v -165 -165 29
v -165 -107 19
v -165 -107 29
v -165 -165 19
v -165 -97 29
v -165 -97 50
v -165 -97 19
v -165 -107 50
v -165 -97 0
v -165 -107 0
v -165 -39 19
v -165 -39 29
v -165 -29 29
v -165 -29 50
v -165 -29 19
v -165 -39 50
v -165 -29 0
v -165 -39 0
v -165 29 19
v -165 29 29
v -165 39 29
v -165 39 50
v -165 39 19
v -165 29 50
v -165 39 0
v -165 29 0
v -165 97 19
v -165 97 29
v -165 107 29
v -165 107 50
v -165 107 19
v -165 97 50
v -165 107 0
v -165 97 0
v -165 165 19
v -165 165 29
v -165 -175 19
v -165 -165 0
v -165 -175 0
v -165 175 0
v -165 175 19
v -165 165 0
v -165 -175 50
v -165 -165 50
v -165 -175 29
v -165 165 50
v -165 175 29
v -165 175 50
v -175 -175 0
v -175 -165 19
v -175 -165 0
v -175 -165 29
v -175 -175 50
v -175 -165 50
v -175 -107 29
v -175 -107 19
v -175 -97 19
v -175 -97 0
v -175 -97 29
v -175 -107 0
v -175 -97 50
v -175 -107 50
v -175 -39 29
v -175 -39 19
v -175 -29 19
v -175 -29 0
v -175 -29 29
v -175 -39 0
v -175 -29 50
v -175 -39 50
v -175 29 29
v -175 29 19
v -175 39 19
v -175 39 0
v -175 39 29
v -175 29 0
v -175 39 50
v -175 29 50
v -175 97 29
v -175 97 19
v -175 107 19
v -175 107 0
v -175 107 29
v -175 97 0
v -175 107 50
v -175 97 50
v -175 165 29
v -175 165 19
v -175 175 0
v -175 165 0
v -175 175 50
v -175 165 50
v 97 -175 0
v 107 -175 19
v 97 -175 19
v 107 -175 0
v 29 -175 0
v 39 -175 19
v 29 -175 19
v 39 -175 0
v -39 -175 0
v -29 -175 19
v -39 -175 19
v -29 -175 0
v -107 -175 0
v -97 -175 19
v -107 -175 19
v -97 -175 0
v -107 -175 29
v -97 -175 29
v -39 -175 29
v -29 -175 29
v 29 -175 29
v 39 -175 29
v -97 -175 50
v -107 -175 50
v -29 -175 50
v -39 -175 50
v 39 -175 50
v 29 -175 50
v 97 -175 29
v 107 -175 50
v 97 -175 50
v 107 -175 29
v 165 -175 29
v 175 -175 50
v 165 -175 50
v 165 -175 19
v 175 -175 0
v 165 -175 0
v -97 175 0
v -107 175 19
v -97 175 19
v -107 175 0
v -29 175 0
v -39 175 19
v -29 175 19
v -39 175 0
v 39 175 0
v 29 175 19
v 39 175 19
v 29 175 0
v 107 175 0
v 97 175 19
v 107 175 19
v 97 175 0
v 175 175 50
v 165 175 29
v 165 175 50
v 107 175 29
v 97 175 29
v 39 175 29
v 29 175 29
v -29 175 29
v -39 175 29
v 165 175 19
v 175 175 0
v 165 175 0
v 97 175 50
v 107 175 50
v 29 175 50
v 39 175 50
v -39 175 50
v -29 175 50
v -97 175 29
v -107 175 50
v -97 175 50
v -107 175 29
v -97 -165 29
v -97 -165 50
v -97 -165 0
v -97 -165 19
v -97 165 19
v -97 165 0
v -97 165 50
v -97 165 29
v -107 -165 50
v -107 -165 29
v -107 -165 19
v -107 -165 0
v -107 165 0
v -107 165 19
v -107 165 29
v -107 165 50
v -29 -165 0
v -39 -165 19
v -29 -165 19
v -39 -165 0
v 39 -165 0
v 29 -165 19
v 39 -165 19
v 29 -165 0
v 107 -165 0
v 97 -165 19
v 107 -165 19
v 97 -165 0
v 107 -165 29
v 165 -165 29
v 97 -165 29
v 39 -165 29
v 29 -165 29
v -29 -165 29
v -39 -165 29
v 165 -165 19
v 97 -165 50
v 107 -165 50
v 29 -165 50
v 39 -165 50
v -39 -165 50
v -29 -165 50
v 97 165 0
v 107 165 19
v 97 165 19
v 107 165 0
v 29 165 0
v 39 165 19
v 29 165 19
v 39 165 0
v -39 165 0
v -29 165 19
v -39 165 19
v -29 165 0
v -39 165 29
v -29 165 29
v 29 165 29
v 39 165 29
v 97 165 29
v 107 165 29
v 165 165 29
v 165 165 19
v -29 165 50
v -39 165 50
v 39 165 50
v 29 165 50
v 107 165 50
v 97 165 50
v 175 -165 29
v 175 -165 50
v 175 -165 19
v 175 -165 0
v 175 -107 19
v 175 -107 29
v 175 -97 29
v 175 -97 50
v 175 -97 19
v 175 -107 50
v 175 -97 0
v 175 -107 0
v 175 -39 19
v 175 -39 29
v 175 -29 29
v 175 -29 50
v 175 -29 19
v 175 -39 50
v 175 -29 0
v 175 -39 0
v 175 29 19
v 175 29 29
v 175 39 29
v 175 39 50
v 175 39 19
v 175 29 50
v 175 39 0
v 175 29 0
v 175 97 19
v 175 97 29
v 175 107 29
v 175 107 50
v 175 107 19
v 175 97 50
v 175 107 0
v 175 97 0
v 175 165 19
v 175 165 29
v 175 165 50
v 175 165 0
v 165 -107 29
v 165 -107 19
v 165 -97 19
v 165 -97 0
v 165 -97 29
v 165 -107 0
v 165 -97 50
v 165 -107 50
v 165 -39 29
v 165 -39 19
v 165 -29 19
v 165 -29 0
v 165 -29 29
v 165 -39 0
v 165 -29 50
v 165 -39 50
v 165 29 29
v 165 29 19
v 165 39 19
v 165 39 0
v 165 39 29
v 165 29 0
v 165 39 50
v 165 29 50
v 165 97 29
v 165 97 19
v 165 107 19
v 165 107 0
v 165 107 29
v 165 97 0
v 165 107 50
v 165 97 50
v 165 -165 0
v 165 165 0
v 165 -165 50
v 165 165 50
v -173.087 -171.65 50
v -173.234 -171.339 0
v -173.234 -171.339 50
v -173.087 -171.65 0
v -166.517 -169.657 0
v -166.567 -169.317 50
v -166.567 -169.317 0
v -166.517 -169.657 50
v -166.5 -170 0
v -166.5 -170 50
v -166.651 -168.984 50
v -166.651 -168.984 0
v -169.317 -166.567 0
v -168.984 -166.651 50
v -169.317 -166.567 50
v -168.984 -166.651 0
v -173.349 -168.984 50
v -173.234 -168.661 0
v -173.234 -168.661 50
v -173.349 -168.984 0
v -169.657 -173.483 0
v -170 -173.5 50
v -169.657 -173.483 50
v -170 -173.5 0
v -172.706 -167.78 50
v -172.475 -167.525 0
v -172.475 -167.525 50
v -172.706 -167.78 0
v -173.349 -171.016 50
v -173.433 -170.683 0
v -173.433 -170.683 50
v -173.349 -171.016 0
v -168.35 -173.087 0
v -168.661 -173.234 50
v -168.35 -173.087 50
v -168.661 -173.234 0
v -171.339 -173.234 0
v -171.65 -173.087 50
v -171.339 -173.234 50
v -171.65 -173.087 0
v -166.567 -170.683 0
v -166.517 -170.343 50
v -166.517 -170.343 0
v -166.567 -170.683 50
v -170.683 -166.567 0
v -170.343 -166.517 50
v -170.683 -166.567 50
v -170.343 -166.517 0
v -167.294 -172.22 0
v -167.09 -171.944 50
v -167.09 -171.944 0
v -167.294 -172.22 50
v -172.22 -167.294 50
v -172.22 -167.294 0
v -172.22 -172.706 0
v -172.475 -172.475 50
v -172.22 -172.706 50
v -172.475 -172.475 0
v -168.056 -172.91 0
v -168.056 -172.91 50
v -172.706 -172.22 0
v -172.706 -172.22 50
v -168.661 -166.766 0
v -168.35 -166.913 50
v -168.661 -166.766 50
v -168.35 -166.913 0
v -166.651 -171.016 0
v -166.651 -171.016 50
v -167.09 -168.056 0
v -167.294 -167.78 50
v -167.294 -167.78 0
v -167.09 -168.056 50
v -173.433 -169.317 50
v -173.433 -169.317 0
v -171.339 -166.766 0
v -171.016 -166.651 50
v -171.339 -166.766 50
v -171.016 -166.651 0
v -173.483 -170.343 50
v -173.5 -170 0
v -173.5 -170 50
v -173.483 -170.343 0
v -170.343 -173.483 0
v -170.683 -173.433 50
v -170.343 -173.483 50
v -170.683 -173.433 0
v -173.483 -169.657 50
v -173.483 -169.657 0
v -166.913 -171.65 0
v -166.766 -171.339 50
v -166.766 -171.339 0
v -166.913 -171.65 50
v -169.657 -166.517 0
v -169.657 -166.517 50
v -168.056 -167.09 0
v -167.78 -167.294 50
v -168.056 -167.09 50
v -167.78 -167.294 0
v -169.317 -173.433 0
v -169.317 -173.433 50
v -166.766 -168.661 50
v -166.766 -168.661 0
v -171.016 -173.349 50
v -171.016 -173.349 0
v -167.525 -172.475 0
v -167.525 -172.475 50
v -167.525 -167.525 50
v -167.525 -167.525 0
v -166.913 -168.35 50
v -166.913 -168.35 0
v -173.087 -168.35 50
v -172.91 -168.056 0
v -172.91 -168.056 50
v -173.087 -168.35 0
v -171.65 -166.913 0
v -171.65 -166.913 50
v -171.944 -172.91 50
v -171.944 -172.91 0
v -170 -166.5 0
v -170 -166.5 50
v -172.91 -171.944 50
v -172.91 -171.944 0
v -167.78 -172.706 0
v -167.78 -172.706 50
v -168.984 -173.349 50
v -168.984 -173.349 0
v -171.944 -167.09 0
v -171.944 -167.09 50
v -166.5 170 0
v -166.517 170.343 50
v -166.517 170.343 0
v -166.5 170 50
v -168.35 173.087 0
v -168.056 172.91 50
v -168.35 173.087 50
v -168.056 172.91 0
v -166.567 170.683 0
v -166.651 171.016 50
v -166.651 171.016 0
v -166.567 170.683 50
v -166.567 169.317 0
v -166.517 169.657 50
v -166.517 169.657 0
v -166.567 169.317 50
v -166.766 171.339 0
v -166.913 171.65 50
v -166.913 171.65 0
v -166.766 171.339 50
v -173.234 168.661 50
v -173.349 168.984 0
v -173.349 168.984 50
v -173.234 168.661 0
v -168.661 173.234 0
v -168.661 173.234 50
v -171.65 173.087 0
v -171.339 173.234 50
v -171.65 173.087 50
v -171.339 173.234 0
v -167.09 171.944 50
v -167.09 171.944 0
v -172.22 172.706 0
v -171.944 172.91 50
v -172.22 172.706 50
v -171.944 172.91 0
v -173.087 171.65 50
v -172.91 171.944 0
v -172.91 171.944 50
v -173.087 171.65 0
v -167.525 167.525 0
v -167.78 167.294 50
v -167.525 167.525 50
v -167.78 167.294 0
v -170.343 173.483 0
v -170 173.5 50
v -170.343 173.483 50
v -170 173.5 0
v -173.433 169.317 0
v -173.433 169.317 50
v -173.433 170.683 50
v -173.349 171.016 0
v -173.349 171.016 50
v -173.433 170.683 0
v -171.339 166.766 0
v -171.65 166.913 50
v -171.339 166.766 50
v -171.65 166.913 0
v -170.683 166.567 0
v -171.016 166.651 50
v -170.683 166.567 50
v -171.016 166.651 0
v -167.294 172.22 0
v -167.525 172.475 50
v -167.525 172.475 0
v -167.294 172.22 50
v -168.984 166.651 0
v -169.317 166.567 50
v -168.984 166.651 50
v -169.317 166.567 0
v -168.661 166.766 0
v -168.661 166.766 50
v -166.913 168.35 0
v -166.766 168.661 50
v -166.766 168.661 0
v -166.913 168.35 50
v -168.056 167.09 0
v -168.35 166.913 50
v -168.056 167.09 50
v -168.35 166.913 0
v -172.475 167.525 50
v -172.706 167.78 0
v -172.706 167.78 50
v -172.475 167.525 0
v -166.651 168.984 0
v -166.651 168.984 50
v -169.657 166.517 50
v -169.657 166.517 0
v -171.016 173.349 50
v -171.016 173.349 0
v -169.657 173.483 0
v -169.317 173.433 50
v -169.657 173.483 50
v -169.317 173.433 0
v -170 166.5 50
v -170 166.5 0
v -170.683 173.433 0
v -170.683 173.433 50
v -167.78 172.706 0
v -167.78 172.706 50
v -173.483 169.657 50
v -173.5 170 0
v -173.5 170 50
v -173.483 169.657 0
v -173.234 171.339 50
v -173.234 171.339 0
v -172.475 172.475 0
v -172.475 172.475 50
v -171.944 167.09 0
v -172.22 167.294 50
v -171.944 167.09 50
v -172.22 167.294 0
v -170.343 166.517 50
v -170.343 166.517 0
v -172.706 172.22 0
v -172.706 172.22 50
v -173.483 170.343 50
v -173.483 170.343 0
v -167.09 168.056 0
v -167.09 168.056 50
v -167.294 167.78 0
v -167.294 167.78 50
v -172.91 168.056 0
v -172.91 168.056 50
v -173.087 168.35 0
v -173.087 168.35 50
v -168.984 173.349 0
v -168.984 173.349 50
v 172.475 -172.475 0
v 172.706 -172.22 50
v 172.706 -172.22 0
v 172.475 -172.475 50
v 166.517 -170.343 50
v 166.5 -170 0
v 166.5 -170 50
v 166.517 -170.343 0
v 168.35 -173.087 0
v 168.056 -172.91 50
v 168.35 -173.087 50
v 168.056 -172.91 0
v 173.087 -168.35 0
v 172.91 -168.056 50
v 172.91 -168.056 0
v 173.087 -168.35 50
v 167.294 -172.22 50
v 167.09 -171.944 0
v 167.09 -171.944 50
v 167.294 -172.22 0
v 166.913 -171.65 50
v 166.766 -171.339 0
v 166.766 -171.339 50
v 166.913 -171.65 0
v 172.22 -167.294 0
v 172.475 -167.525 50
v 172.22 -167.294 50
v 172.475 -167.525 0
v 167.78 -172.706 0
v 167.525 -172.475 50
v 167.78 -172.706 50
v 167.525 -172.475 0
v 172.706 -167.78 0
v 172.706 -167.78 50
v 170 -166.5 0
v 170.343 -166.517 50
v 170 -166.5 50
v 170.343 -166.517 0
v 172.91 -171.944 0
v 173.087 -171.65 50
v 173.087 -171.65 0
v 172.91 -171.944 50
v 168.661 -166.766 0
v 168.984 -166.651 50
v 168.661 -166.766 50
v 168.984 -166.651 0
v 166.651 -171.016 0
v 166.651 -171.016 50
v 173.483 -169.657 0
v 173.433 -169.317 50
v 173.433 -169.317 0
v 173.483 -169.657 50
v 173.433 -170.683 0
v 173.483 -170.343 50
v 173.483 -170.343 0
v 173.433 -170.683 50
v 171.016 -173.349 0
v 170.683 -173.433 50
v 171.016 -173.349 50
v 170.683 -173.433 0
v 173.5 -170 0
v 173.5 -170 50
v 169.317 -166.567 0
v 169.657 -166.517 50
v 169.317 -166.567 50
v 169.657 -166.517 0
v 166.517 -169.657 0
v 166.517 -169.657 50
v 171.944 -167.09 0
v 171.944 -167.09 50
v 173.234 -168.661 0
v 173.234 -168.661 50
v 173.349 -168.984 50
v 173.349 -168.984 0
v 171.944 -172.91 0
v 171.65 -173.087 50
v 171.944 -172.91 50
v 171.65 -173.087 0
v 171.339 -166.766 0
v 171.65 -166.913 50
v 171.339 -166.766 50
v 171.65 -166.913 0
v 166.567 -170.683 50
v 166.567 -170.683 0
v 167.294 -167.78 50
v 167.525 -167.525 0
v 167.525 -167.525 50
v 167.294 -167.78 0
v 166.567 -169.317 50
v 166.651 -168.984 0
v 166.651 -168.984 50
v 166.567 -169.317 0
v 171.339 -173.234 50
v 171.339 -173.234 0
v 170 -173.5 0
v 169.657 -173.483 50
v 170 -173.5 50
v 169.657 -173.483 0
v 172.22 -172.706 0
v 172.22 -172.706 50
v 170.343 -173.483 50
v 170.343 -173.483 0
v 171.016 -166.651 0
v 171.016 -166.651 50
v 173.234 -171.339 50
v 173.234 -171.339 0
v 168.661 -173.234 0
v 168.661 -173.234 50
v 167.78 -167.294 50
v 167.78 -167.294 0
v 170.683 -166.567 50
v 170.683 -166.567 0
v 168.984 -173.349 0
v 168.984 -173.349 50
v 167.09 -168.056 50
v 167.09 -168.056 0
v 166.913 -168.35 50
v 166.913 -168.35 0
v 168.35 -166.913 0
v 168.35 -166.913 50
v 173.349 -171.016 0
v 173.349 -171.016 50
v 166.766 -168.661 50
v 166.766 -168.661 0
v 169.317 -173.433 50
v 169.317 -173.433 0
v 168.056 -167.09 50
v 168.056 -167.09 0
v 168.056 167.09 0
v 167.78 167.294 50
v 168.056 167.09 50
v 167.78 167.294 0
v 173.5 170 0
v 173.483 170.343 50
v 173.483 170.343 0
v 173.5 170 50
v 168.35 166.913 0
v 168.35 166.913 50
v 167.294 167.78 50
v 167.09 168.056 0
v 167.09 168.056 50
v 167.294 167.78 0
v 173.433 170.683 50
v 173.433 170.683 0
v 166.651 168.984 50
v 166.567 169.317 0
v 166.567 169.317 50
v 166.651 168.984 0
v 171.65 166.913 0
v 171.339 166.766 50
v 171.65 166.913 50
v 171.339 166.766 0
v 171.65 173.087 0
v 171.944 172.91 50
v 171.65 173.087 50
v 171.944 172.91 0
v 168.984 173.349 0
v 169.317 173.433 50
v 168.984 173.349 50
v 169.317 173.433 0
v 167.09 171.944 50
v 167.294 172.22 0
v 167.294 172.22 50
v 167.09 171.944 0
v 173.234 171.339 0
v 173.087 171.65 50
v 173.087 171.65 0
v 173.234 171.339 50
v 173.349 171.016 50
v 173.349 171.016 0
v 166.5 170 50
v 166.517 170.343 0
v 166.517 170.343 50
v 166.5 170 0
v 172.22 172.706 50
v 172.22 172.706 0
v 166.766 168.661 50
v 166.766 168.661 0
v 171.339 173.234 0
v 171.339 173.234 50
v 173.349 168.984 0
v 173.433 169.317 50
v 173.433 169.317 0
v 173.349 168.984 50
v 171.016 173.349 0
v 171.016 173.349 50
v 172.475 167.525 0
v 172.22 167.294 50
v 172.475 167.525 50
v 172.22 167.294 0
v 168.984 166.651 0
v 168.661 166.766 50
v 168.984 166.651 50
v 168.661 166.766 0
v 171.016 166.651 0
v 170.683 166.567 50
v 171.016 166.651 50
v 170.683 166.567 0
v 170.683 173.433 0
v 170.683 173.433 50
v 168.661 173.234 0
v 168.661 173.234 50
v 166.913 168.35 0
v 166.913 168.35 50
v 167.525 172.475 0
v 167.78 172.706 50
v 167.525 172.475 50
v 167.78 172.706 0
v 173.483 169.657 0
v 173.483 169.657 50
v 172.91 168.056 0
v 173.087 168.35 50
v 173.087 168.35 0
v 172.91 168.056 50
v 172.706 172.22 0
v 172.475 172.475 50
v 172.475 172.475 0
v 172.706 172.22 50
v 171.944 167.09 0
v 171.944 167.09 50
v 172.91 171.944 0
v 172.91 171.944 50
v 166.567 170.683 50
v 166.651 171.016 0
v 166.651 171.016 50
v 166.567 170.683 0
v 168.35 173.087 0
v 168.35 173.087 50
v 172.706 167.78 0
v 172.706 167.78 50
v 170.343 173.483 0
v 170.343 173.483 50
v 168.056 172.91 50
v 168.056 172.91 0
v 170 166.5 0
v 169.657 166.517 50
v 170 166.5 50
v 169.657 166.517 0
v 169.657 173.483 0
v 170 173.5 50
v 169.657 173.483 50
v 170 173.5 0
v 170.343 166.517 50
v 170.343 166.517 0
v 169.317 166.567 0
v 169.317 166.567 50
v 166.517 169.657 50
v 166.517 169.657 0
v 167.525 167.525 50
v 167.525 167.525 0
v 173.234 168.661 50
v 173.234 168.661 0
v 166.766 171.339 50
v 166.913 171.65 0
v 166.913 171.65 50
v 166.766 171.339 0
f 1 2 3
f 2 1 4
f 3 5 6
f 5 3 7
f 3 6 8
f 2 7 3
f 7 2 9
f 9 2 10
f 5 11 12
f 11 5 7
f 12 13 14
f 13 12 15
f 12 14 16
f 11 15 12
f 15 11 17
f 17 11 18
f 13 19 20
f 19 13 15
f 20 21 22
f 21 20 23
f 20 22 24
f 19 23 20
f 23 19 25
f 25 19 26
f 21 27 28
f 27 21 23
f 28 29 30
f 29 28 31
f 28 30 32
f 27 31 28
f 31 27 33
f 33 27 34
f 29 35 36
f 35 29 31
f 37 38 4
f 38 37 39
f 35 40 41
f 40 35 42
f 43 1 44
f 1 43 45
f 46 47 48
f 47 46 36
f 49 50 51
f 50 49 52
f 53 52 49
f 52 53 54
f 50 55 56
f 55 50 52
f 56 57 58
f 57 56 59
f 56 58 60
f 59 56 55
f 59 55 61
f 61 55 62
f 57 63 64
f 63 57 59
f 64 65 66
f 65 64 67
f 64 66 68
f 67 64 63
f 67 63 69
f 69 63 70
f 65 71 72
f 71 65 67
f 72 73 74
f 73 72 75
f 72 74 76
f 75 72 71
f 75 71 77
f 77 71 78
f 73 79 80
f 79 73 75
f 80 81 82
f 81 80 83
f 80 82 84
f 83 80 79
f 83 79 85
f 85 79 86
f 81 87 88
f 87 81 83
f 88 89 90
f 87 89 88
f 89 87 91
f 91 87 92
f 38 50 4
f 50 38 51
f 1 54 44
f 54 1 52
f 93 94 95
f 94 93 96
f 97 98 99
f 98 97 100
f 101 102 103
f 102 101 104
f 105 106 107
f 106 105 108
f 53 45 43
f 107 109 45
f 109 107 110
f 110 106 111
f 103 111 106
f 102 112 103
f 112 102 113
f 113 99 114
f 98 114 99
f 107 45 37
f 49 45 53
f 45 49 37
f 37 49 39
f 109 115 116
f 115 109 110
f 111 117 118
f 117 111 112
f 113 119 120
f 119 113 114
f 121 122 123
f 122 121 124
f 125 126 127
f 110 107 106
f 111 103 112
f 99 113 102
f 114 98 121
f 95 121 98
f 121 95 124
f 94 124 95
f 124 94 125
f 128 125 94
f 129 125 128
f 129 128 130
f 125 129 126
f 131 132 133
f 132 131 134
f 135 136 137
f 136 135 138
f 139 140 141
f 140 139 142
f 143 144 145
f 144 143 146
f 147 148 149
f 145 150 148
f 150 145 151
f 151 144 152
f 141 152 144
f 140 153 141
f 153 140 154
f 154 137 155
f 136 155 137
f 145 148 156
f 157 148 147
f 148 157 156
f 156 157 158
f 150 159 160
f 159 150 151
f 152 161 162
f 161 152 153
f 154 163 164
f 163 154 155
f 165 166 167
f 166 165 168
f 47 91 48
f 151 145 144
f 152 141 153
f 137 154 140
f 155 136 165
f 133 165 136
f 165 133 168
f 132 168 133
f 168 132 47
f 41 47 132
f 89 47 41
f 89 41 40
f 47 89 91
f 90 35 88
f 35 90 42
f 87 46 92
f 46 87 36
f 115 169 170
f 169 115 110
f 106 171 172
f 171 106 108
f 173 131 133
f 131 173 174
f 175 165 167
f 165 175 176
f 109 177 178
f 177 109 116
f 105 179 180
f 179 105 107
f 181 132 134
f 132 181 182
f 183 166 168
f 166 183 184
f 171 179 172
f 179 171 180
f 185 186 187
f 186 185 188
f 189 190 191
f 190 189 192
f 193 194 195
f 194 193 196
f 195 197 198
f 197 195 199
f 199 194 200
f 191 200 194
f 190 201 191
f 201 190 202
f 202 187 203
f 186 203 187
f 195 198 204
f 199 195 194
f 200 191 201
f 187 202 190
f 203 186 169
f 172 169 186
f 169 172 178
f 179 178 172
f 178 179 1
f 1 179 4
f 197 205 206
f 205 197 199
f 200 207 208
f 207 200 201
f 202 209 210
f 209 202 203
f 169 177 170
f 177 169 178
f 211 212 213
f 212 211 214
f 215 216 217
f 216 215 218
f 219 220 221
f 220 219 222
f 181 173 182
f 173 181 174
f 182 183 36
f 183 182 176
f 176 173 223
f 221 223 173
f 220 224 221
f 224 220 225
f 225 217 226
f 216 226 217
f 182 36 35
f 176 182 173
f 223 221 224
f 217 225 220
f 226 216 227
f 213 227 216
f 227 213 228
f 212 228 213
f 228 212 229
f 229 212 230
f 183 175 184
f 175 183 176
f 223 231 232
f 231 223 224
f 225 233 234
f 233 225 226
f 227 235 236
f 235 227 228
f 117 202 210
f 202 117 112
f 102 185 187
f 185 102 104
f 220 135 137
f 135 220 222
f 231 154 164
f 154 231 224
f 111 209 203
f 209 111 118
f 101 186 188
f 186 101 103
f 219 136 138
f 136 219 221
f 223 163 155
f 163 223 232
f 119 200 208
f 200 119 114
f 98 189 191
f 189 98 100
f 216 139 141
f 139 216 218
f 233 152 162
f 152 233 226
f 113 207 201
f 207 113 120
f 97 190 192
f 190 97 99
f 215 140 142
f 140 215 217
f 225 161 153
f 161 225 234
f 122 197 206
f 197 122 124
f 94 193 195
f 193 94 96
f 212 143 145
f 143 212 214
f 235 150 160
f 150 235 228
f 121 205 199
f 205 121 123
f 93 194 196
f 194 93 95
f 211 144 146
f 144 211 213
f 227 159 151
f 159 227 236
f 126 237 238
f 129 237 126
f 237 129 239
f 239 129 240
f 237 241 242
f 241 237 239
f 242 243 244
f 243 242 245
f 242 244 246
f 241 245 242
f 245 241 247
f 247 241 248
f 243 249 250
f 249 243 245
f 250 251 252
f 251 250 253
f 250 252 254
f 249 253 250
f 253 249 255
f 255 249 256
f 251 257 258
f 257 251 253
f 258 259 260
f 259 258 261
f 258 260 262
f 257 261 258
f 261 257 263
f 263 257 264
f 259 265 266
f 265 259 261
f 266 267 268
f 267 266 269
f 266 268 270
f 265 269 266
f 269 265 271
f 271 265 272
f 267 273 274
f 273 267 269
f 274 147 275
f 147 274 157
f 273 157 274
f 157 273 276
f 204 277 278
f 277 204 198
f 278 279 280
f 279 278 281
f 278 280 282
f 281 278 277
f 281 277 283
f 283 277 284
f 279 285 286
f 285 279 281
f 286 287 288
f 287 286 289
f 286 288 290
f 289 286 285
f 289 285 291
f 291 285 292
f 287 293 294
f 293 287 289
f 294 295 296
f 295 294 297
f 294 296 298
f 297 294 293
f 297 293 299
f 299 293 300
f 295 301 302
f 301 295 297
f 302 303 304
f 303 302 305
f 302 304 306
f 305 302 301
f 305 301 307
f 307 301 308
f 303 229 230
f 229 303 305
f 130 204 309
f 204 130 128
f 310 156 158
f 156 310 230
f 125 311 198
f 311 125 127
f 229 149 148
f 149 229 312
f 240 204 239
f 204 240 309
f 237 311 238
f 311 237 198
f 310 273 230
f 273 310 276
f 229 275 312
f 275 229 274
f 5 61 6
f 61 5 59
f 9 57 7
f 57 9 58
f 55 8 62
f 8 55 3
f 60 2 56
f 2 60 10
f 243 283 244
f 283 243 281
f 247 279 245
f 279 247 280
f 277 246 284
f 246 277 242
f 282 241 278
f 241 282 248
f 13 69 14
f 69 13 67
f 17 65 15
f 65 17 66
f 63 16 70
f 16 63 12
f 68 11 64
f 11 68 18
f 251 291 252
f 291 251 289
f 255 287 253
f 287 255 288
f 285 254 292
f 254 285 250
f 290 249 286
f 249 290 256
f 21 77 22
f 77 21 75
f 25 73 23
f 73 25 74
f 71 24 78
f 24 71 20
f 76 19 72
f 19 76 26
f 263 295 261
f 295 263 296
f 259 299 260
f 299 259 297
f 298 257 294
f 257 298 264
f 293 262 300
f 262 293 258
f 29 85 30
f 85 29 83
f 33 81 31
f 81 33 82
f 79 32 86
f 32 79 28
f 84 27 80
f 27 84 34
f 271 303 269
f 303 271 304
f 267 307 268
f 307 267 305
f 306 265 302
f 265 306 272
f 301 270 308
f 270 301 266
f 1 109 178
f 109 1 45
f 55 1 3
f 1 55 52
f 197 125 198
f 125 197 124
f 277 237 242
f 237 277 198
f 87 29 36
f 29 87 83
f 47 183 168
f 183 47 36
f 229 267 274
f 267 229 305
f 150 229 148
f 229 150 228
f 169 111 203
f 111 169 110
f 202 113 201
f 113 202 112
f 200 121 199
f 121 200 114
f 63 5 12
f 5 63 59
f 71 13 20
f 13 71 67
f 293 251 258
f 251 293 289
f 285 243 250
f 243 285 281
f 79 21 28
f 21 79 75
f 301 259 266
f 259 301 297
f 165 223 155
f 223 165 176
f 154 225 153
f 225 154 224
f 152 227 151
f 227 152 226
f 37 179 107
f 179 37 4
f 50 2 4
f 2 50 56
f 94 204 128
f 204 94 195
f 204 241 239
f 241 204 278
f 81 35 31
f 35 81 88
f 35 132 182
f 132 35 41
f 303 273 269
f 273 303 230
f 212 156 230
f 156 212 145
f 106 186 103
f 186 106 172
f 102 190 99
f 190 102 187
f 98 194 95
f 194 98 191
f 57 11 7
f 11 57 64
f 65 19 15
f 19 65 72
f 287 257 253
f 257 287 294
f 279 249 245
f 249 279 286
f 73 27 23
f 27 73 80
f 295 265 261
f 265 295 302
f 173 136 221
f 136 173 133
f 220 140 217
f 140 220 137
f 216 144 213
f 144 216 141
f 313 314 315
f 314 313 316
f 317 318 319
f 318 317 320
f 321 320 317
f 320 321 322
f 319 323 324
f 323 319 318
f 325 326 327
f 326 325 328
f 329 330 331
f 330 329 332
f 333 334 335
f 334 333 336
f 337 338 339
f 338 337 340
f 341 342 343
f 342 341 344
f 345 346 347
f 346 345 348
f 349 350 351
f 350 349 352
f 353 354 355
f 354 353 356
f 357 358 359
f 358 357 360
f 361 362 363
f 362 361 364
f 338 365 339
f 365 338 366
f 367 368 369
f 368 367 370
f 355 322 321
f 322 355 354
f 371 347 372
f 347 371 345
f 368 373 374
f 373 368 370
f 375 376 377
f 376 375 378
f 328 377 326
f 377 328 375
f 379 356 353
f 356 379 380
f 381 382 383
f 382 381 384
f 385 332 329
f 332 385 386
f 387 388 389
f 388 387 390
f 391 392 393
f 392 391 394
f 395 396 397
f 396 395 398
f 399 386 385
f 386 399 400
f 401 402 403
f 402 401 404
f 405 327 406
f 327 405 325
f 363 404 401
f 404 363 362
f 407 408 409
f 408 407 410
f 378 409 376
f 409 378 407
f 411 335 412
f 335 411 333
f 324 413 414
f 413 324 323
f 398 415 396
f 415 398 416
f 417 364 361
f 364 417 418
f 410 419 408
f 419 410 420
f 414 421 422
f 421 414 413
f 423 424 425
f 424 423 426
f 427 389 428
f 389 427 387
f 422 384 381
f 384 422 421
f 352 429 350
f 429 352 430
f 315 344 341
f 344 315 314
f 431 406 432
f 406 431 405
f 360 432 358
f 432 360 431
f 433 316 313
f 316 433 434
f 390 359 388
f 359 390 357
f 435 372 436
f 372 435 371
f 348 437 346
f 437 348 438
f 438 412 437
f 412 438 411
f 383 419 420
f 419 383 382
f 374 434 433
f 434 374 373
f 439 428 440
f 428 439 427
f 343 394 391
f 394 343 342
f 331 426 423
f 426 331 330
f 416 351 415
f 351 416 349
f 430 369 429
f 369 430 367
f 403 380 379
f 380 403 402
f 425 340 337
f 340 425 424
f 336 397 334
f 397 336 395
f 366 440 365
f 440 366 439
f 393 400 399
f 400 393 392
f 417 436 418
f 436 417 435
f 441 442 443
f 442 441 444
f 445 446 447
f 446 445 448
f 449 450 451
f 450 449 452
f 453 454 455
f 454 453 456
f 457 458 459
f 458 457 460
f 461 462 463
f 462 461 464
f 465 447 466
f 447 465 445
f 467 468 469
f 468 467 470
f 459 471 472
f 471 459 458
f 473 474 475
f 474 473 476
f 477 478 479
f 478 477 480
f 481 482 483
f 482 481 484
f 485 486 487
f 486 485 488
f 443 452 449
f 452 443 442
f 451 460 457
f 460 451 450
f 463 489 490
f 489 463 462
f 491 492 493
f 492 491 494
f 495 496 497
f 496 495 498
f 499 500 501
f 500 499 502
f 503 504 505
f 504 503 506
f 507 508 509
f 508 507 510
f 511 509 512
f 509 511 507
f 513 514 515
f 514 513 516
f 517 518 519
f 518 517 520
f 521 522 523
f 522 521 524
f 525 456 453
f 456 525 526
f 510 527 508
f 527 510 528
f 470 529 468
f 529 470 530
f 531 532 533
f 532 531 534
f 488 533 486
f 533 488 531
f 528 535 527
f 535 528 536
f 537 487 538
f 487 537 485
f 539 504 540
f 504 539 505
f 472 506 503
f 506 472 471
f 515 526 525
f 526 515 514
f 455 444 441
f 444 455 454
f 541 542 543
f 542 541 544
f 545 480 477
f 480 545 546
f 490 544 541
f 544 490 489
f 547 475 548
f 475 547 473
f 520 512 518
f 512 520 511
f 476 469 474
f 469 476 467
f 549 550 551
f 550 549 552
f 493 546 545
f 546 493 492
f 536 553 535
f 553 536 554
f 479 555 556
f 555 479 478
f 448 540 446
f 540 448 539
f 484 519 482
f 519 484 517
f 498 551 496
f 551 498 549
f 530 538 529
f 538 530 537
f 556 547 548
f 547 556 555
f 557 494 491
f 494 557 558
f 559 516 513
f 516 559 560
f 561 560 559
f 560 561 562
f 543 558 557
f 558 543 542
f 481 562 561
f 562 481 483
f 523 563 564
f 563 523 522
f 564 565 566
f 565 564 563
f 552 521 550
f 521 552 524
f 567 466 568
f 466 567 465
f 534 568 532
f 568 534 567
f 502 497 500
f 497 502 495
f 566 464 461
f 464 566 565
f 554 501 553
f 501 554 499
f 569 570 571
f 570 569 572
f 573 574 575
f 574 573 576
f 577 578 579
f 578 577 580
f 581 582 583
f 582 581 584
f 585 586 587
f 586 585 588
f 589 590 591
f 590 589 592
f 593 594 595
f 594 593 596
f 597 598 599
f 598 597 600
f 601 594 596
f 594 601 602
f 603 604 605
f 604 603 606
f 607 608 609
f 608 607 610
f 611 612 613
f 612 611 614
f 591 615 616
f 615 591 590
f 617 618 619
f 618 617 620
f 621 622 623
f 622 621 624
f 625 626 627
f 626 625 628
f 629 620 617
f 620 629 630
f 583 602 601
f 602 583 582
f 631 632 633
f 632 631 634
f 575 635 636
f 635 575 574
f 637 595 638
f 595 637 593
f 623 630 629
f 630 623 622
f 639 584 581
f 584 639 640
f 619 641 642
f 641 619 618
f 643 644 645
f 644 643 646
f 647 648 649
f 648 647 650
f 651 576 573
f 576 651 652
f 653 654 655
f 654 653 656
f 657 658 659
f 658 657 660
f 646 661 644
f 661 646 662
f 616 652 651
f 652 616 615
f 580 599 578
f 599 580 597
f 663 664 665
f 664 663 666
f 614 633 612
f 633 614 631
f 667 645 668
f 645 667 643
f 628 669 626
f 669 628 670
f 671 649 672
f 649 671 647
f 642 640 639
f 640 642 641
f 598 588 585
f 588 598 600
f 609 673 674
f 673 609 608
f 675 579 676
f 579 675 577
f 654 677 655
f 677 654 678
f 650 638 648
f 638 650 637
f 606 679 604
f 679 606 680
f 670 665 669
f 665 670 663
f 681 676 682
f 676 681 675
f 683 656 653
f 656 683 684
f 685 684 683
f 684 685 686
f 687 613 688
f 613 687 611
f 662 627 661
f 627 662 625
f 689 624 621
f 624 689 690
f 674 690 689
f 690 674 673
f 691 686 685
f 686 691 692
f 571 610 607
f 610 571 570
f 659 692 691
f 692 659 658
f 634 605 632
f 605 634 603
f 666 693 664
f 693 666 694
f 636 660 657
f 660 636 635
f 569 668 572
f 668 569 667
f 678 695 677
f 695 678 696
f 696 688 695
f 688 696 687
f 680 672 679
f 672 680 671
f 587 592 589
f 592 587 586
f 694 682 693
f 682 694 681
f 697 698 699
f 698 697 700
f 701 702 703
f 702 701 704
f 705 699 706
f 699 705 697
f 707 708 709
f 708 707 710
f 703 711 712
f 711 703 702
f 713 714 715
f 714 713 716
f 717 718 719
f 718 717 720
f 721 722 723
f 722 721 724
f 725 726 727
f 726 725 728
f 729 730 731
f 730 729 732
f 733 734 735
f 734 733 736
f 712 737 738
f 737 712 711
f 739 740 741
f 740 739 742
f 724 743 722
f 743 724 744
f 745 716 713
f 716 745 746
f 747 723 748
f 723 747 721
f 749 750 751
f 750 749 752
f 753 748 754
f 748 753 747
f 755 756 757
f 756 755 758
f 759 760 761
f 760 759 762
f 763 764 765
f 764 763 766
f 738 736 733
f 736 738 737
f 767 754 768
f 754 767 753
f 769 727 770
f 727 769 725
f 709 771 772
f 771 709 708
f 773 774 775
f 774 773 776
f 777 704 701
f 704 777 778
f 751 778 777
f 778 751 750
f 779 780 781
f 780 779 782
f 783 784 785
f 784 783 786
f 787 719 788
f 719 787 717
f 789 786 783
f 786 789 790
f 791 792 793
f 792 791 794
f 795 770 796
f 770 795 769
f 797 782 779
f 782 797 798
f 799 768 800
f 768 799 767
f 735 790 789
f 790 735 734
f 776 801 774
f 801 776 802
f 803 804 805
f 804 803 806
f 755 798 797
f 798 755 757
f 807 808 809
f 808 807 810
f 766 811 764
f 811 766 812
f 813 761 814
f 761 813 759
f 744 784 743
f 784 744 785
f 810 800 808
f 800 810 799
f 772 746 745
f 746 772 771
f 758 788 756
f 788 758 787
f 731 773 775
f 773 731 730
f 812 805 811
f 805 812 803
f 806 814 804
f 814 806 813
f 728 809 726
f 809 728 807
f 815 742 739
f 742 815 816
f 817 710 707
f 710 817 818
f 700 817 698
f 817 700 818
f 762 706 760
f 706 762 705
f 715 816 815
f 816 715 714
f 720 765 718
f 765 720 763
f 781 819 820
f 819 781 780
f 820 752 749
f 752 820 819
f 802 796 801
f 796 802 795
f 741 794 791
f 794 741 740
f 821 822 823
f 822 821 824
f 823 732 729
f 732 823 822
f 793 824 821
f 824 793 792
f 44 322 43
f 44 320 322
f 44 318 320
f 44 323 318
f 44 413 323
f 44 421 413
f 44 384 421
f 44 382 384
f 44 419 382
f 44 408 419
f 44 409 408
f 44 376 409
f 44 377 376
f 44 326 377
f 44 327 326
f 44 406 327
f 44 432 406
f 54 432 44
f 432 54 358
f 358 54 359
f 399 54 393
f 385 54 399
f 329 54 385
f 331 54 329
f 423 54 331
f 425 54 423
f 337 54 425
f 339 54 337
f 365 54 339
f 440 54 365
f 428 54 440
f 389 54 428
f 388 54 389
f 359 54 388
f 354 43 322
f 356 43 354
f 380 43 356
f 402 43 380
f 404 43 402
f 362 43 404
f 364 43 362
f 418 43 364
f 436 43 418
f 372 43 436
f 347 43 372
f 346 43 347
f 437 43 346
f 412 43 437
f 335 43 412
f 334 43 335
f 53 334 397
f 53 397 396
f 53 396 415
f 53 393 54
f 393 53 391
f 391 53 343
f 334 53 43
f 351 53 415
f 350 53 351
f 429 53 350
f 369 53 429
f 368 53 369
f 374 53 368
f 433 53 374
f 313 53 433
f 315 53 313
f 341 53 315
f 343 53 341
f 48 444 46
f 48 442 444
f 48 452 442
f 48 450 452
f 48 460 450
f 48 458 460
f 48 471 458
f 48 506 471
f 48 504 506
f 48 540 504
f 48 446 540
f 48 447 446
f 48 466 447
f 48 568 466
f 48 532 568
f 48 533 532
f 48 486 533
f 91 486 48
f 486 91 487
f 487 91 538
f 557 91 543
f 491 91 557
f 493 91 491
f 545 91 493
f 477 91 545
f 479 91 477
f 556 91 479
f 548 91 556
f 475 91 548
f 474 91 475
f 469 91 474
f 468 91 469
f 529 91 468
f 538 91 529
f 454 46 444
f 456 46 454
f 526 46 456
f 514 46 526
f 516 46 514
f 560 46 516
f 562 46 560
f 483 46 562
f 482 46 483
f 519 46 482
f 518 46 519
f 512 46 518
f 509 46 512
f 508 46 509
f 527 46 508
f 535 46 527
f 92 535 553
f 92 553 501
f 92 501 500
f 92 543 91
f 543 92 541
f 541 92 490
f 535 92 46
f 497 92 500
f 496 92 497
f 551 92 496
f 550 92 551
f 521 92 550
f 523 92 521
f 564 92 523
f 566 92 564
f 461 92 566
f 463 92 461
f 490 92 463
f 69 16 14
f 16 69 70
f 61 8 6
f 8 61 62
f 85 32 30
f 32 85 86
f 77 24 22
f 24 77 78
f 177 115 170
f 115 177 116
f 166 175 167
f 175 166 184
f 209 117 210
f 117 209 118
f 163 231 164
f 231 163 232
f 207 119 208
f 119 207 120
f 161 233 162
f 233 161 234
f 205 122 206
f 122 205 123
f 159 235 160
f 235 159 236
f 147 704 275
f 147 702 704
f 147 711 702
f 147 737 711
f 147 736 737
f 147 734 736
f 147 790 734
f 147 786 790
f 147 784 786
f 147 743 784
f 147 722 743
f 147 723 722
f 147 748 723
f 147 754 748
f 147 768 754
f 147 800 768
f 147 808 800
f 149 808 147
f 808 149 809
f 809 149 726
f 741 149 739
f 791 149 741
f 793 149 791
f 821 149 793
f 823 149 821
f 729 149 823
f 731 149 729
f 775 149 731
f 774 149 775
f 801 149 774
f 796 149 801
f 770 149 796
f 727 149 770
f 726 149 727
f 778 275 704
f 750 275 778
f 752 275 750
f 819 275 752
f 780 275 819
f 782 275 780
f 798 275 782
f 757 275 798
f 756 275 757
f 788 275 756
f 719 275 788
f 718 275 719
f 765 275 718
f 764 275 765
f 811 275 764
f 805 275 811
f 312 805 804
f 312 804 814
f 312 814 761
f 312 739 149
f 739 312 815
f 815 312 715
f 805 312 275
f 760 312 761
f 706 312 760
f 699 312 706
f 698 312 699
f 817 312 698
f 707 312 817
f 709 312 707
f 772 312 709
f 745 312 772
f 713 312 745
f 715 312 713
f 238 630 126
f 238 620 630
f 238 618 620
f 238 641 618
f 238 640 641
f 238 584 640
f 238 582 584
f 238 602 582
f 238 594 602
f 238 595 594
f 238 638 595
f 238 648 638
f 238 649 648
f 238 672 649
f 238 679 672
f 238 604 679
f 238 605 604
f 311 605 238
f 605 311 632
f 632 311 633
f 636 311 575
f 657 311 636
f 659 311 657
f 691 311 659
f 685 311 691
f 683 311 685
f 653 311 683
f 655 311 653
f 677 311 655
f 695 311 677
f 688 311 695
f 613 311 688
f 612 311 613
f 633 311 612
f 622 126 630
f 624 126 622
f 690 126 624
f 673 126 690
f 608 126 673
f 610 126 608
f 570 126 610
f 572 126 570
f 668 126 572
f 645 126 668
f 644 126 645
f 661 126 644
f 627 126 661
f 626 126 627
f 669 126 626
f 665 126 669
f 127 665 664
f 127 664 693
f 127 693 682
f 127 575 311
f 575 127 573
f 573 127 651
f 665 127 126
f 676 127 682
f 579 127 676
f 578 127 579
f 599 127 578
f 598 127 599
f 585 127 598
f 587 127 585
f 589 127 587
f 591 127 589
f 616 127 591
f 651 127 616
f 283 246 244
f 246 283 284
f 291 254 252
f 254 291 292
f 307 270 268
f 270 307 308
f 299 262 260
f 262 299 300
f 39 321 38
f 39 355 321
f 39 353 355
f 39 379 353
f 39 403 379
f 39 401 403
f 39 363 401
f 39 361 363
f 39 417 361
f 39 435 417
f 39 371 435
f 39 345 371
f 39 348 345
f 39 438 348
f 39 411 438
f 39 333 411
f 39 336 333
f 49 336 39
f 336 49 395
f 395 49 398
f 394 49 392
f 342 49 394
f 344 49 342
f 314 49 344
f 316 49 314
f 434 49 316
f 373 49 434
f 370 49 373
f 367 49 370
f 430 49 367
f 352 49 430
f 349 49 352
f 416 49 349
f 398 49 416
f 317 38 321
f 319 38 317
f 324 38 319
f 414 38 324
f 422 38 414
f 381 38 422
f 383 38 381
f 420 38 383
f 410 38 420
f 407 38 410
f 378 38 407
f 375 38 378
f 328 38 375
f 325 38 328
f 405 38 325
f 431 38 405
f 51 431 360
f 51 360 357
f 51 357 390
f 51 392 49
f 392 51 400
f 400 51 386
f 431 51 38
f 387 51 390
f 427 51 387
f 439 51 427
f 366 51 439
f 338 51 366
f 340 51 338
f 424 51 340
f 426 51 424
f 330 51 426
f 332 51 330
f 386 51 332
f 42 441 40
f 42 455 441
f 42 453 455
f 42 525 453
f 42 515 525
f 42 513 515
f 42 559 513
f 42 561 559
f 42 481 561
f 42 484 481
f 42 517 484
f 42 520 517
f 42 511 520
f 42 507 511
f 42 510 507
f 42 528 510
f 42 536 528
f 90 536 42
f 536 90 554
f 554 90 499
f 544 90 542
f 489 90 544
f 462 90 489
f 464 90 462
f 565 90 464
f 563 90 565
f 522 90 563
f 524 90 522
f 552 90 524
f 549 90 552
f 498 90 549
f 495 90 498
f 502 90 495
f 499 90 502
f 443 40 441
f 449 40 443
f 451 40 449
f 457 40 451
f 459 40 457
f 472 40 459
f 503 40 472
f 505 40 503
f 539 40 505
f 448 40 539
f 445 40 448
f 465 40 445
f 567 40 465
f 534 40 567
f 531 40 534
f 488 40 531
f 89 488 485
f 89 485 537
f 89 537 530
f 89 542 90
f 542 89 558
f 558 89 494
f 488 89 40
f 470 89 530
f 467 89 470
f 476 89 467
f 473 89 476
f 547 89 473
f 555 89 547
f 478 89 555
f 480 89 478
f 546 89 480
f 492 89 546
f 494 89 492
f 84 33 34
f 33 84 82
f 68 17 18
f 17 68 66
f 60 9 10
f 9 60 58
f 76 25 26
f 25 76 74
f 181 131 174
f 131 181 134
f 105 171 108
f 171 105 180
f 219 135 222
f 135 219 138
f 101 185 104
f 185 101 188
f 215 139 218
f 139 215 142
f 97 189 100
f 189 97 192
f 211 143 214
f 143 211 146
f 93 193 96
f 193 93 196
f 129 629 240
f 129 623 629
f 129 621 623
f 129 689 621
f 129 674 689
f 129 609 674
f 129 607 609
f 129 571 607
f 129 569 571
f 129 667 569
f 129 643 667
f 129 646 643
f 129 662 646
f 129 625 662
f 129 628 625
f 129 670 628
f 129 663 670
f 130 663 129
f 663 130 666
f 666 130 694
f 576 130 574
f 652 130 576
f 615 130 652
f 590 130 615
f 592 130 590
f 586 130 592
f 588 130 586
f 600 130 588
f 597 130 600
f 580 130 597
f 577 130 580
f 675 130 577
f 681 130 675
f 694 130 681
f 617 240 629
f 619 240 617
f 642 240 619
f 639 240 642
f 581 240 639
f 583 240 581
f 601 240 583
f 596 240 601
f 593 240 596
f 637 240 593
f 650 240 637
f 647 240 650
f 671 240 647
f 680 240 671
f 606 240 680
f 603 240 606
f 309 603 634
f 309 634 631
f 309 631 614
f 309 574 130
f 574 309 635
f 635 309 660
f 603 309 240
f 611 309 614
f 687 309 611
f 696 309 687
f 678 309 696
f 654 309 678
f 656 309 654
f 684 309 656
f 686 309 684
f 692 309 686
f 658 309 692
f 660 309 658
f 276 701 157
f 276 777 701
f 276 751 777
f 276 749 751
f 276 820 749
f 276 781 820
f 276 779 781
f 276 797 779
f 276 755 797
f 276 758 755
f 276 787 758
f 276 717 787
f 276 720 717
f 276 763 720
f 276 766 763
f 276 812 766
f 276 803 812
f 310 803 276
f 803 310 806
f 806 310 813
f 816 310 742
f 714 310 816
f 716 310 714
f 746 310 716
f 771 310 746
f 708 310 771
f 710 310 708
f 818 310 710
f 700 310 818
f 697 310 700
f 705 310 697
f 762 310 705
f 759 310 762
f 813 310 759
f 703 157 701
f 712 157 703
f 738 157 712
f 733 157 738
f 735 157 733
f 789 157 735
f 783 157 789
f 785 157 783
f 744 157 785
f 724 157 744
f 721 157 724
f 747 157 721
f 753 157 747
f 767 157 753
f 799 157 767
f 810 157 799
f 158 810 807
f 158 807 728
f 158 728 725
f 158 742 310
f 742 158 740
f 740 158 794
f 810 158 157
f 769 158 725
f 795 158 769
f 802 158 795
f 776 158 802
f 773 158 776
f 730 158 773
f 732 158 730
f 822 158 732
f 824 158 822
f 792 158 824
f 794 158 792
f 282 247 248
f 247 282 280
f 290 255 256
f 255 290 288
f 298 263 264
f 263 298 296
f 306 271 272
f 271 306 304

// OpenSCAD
// Cage slice - index 1
bar = 10;
outer = 350;
half = outer / 2;
height = 700;

N_xy = 6;
N_z  = 11;

x_spacing = (outer - bar) / (N_xy - 1);
z_spacing = (height - bar) / (N_z  - 1);

xs = [ for (i = [0 : N_xy - 1]) (-half + bar/2 + i * x_spacing) ];
ys = xs;

zs = [ for (k = [0 : N_z - 1]) (bar/2 + k * z_spacing) ];

$fn = 64;

module cage_bars() {
    union() {
        // Vertical bars on front and back faces
        for (xv = xs) {
            translate([xv, -half + bar/2, height/2])
                cube([bar, bar, height], center = true);
            translate([xv,  half - bar/2, height/2])
                cube([bar, bar, height], center = true);
        }

        // Vertical bars on left and right faces
        for (yv = ys) {
            translate([-half + bar/2, yv, height/2])
                cube([bar, bar, height], center = true);
            translate([ half - bar/2, yv, height/2])
                cube([bar, bar, height], center = true);
        }

        // Horizontal x-bars on front and back faces
        for (zv = zs) {
            translate([0, -half + bar/2, zv])
                cube([outer, bar, bar], center = true);
            translate([0,  half - bar/2, zv])
                cube([outer, bar, bar], center = true);
        }

        // Horizontal y-bars on left and right faces
        for (zv = zs) {
            translate([-half + bar/2, 0, zv])
                cube([bar, outer, bar], center = true);
            translate([ half - bar/2, 0, zv])
                cube([bar, outer, bar], center = true);
        }

        // Floor and ceiling extra x-bars at all y positions
        z_floor = bar/2;
        z_ceil  = height - bar/2;
        for (yv = ys) {
            translate([0, yv, z_floor])
                cube([outer, bar, bar], center = true);
            translate([0, yv, z_ceil])
                cube([outer, bar, bar], center = true);
        }

        // Floor and ceiling extra y-bars at all x positions
        for (xv = xs) {
            translate([xv, 0, z_floor])
                cube([bar, outer, bar], center = true);
            translate([xv, 0, z_ceil])
                cube([bar, outer, bar], center = true);
        }
    }
}

module corner_holes() {
    hole_d = 7;
    for (sx = [-1, 1])
        for (sy = [-1, 1])
            translate([sx * (half - bar/2), sy * (half - bar/2), height/2])
                cylinder(h = height + 2, d = hole_d, center = true);
}

module cage_full() {
    difference() {
        cage_bars();
        corner_holes();
    }
}

slice_index = 1;
slice_height = 50;

module cage_slice() {
    translate([0, 0, -slice_index * slice_height]) {
        intersection() {
            cage_full();
            translate([0, 0, slice_index * slice_height + slice_height/2])
                cube([outer + 20, outer + 20, slice_height], center = true);
        }
    }
}

cage_slice();
